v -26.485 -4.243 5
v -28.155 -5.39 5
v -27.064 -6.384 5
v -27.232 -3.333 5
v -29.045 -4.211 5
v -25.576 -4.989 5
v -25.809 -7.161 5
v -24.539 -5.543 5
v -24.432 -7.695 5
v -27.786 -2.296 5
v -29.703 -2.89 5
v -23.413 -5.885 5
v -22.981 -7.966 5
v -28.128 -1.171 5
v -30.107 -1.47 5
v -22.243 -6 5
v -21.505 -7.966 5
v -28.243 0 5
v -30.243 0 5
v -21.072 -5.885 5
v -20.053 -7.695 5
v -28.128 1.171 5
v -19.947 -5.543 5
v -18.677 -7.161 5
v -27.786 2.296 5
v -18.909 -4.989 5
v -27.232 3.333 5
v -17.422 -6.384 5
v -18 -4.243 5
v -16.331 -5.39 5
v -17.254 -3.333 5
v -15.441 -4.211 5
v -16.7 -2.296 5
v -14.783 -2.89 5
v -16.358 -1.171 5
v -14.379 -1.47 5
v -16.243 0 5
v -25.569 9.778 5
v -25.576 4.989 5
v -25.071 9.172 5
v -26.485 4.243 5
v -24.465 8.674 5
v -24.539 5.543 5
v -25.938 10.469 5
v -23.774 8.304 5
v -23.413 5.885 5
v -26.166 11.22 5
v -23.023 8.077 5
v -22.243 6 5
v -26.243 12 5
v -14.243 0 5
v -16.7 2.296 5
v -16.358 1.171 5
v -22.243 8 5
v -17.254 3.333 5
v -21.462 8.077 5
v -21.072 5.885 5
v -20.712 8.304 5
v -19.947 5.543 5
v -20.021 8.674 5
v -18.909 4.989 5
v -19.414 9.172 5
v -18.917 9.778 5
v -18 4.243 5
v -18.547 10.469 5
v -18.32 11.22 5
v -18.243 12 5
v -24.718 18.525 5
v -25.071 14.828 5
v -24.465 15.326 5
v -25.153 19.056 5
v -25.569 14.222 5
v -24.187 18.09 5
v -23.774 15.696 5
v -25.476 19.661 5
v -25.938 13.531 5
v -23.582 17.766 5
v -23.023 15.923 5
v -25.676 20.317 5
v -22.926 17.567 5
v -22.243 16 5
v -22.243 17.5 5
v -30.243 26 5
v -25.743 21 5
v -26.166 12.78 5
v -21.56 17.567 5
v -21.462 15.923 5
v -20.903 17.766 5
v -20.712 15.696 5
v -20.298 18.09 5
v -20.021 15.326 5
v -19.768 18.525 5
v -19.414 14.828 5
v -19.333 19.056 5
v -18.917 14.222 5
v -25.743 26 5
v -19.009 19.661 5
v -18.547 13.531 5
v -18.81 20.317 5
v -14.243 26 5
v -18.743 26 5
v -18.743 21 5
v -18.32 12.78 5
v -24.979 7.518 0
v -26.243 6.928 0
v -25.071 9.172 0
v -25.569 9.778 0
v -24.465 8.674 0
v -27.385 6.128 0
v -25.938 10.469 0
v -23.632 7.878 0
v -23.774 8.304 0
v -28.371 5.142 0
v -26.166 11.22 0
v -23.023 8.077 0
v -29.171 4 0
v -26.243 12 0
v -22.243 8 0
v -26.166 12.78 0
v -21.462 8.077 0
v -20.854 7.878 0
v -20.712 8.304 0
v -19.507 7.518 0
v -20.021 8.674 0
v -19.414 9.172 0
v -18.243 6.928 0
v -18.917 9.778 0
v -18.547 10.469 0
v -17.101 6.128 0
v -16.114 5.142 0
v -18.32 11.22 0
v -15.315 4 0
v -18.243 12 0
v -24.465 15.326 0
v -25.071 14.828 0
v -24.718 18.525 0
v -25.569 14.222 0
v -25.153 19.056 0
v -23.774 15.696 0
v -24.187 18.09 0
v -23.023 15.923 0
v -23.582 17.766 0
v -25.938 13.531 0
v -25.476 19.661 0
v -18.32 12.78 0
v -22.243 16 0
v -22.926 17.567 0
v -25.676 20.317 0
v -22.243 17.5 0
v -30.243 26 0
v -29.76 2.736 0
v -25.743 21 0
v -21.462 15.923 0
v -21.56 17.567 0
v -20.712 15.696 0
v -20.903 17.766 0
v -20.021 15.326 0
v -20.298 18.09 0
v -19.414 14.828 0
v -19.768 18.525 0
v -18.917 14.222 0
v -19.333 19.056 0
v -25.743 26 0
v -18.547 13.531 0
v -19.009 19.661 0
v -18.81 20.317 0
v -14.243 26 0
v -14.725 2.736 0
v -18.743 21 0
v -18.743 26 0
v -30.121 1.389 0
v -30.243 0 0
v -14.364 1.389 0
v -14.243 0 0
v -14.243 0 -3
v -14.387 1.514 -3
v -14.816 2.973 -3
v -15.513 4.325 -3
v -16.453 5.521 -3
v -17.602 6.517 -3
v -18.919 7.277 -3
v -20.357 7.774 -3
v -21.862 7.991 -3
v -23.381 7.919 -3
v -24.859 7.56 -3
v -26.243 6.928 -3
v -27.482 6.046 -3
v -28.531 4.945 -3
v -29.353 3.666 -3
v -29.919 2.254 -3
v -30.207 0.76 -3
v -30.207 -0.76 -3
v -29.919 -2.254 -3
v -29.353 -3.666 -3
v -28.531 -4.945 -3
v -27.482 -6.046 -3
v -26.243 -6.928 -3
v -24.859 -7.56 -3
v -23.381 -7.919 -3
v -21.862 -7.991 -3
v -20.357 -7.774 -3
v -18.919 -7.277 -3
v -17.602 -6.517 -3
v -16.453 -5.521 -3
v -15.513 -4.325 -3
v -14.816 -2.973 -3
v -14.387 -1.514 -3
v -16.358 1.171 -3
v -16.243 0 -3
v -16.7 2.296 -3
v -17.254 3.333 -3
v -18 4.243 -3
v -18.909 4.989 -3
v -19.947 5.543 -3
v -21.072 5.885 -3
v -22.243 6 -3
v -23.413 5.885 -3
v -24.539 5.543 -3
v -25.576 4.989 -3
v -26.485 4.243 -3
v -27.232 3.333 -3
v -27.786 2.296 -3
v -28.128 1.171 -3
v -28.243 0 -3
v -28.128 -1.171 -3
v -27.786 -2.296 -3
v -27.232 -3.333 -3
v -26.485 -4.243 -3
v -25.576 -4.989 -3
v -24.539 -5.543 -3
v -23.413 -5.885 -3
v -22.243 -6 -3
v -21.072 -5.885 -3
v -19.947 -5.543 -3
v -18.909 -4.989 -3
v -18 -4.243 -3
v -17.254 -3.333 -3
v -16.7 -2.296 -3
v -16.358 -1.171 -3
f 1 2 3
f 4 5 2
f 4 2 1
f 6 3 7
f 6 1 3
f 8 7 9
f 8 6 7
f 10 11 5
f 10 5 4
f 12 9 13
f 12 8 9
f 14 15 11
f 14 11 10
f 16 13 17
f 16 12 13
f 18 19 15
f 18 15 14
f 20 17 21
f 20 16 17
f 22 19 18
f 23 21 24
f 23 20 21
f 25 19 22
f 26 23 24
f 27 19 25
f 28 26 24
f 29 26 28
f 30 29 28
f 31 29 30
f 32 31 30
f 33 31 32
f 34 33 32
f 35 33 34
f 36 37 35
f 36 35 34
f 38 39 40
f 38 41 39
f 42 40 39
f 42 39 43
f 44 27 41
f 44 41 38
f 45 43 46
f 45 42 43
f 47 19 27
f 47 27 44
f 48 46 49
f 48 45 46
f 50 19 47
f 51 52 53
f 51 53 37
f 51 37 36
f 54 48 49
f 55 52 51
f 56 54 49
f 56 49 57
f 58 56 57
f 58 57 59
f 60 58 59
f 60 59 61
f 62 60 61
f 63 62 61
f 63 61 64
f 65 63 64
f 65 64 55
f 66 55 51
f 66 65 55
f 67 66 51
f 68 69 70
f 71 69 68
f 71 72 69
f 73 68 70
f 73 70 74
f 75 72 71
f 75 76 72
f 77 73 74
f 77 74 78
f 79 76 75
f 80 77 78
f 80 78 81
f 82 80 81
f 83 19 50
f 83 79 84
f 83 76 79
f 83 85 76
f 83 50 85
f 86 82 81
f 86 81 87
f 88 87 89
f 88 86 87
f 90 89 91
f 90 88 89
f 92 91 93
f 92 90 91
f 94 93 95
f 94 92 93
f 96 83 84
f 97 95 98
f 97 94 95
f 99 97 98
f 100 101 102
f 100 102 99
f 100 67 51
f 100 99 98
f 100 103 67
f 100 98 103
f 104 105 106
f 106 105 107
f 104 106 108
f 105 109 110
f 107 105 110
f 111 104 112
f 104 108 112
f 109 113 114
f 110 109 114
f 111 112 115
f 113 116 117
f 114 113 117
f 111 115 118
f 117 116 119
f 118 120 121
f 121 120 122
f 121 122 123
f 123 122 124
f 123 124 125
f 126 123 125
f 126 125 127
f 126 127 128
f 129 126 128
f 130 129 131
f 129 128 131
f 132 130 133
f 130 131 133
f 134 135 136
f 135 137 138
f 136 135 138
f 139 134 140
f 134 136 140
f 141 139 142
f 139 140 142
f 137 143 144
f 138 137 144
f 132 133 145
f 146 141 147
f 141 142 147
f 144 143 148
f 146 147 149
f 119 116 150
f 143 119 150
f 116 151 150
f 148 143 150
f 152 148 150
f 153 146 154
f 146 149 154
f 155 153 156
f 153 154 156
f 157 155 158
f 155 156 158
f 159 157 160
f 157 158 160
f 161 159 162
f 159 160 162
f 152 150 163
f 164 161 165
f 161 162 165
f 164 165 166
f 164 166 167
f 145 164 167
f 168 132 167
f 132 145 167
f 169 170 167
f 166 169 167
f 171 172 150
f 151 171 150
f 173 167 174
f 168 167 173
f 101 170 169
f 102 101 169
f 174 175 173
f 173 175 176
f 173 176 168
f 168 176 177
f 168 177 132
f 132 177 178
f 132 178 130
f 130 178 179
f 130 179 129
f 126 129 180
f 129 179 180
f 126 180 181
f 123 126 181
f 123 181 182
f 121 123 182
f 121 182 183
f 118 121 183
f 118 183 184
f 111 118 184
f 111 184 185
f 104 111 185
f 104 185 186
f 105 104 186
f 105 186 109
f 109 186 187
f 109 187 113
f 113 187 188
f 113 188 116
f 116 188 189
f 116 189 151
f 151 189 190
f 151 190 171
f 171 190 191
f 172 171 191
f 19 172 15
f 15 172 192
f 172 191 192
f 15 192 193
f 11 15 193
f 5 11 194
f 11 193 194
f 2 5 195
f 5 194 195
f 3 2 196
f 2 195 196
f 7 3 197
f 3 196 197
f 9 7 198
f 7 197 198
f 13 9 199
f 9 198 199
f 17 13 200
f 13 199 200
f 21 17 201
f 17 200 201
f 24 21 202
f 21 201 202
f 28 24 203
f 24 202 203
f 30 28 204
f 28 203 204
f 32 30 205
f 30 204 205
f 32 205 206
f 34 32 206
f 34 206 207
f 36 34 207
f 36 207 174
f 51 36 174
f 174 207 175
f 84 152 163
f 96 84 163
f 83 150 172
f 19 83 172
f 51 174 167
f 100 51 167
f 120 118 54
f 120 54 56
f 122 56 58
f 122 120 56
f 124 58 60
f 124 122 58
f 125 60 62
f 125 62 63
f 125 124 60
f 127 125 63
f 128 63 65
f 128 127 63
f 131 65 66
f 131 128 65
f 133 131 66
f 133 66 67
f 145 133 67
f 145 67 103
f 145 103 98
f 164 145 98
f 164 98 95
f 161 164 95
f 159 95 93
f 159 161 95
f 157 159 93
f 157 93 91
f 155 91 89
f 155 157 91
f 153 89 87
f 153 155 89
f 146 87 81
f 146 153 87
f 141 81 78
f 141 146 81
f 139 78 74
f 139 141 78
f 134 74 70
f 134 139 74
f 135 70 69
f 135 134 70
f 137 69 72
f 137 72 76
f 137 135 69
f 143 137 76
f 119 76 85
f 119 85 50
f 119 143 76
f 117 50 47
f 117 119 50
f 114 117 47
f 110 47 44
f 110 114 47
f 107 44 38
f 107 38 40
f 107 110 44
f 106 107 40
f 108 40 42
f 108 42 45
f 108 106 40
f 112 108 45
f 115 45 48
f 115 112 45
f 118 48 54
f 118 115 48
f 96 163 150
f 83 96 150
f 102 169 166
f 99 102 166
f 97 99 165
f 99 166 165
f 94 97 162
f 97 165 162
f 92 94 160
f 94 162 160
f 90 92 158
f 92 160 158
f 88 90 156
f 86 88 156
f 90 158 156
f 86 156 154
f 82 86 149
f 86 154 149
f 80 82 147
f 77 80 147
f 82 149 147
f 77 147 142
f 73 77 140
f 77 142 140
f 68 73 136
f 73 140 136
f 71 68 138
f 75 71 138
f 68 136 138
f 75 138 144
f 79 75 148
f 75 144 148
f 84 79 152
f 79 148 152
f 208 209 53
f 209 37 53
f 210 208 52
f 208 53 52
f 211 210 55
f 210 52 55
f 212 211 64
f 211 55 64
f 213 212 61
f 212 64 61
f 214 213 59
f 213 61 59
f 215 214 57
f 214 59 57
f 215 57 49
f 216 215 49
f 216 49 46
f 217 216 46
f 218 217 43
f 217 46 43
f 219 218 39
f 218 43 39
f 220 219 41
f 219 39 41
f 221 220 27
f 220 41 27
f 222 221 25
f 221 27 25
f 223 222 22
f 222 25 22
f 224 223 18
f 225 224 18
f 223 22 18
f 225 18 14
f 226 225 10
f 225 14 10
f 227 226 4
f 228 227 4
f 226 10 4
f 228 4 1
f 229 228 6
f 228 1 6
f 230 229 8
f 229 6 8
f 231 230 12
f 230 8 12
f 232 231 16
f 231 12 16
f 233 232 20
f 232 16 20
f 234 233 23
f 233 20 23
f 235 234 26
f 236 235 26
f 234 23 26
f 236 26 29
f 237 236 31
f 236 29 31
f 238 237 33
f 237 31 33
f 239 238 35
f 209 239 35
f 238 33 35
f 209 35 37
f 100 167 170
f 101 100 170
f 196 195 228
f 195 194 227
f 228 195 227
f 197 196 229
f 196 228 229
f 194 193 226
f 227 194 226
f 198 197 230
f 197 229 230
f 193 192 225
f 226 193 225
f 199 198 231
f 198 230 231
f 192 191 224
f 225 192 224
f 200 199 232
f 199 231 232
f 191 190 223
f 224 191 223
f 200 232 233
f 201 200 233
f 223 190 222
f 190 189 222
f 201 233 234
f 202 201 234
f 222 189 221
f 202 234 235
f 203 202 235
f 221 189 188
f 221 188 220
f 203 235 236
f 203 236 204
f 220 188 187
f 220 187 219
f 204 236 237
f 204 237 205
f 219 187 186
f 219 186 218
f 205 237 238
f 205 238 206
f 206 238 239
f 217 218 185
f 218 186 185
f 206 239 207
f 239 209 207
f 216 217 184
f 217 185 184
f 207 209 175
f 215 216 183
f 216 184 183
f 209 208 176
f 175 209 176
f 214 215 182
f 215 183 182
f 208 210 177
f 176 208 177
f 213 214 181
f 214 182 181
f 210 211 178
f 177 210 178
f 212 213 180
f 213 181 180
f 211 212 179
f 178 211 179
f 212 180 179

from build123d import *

# Parameters (mm, degrees)
ESQUISSE1_R          = 4
BASE_EXTRUSION_DEPTH = 5
BOSS_EXTRU_1_START   = -8
ESQUISSE2_R          = 8
BOSS_EXTRU_1_DEPTH   = 8
PER_AGE1_D           = 12
PER_AGE1_DEPTH       = 8
PER_AGE1_TIP         = 3.605163714


with BuildPart() as part:
    # Esquisse1 → Base-Extrusion (new body)
    with BuildSketch(Plane.XY):
        with BuildLine():
            Line((-25.742801556, 26), (-30.242801556, 26))
            Line((-30.242801556, 26), (-30.242801556, 0))
            ThreePointArc((-30.242801556, 0), (-22.242801556, -8), (-14.242801556, 0))
            Line((-14.242801556, 0), (-14.242801556, 26))
            Line((-14.242801556, 26), (-18.742801556, 26))
            Line((-18.742801556, 26), (-18.742801556, 21))
            ThreePointArc((-18.742801556, 21), (-22.242801556, 17.5), (-25.742801556, 21))
            Line((-25.742801556, 21), (-25.742801556, 26))
        make_face()
        with Locations(Location((-22.242801556, 12, 0), (0, 0, 270))):
            Circle(ESQUISSE1_R, mode=Mode.SUBTRACT)
    extrude(amount=BASE_EXTRUSION_DEPTH)

    # Esquisse2 → Boss.-Extru.1 (add)
    with BuildSketch(Plane.XY.offset(5).offset(BOSS_EXTRU_1_START)):
        with Locations((-22.242801556, 0)):
            Circle(ESQUISSE2_R)
    extrude(amount=BOSS_EXTRU_1_DEPTH)

    # Perçage1
    with Locations(Plane(origin=(0, 0, -3), x_dir=(-1, 0, 0), z_dir=(0, 0, -1))):
        with Locations((22.242801556, 0)):
            Hole(PER_AGE1_D / 2, depth=PER_AGE1_DEPTH)
            with Locations((0, 0, -(PER_AGE1_DEPTH + PER_AGE1_TIP / 2))):  # 118° drill point
                Cone(0, PER_AGE1_D / 2, PER_AGE1_TIP, mode=Mode.SUBTRACT)


solid = part.part
